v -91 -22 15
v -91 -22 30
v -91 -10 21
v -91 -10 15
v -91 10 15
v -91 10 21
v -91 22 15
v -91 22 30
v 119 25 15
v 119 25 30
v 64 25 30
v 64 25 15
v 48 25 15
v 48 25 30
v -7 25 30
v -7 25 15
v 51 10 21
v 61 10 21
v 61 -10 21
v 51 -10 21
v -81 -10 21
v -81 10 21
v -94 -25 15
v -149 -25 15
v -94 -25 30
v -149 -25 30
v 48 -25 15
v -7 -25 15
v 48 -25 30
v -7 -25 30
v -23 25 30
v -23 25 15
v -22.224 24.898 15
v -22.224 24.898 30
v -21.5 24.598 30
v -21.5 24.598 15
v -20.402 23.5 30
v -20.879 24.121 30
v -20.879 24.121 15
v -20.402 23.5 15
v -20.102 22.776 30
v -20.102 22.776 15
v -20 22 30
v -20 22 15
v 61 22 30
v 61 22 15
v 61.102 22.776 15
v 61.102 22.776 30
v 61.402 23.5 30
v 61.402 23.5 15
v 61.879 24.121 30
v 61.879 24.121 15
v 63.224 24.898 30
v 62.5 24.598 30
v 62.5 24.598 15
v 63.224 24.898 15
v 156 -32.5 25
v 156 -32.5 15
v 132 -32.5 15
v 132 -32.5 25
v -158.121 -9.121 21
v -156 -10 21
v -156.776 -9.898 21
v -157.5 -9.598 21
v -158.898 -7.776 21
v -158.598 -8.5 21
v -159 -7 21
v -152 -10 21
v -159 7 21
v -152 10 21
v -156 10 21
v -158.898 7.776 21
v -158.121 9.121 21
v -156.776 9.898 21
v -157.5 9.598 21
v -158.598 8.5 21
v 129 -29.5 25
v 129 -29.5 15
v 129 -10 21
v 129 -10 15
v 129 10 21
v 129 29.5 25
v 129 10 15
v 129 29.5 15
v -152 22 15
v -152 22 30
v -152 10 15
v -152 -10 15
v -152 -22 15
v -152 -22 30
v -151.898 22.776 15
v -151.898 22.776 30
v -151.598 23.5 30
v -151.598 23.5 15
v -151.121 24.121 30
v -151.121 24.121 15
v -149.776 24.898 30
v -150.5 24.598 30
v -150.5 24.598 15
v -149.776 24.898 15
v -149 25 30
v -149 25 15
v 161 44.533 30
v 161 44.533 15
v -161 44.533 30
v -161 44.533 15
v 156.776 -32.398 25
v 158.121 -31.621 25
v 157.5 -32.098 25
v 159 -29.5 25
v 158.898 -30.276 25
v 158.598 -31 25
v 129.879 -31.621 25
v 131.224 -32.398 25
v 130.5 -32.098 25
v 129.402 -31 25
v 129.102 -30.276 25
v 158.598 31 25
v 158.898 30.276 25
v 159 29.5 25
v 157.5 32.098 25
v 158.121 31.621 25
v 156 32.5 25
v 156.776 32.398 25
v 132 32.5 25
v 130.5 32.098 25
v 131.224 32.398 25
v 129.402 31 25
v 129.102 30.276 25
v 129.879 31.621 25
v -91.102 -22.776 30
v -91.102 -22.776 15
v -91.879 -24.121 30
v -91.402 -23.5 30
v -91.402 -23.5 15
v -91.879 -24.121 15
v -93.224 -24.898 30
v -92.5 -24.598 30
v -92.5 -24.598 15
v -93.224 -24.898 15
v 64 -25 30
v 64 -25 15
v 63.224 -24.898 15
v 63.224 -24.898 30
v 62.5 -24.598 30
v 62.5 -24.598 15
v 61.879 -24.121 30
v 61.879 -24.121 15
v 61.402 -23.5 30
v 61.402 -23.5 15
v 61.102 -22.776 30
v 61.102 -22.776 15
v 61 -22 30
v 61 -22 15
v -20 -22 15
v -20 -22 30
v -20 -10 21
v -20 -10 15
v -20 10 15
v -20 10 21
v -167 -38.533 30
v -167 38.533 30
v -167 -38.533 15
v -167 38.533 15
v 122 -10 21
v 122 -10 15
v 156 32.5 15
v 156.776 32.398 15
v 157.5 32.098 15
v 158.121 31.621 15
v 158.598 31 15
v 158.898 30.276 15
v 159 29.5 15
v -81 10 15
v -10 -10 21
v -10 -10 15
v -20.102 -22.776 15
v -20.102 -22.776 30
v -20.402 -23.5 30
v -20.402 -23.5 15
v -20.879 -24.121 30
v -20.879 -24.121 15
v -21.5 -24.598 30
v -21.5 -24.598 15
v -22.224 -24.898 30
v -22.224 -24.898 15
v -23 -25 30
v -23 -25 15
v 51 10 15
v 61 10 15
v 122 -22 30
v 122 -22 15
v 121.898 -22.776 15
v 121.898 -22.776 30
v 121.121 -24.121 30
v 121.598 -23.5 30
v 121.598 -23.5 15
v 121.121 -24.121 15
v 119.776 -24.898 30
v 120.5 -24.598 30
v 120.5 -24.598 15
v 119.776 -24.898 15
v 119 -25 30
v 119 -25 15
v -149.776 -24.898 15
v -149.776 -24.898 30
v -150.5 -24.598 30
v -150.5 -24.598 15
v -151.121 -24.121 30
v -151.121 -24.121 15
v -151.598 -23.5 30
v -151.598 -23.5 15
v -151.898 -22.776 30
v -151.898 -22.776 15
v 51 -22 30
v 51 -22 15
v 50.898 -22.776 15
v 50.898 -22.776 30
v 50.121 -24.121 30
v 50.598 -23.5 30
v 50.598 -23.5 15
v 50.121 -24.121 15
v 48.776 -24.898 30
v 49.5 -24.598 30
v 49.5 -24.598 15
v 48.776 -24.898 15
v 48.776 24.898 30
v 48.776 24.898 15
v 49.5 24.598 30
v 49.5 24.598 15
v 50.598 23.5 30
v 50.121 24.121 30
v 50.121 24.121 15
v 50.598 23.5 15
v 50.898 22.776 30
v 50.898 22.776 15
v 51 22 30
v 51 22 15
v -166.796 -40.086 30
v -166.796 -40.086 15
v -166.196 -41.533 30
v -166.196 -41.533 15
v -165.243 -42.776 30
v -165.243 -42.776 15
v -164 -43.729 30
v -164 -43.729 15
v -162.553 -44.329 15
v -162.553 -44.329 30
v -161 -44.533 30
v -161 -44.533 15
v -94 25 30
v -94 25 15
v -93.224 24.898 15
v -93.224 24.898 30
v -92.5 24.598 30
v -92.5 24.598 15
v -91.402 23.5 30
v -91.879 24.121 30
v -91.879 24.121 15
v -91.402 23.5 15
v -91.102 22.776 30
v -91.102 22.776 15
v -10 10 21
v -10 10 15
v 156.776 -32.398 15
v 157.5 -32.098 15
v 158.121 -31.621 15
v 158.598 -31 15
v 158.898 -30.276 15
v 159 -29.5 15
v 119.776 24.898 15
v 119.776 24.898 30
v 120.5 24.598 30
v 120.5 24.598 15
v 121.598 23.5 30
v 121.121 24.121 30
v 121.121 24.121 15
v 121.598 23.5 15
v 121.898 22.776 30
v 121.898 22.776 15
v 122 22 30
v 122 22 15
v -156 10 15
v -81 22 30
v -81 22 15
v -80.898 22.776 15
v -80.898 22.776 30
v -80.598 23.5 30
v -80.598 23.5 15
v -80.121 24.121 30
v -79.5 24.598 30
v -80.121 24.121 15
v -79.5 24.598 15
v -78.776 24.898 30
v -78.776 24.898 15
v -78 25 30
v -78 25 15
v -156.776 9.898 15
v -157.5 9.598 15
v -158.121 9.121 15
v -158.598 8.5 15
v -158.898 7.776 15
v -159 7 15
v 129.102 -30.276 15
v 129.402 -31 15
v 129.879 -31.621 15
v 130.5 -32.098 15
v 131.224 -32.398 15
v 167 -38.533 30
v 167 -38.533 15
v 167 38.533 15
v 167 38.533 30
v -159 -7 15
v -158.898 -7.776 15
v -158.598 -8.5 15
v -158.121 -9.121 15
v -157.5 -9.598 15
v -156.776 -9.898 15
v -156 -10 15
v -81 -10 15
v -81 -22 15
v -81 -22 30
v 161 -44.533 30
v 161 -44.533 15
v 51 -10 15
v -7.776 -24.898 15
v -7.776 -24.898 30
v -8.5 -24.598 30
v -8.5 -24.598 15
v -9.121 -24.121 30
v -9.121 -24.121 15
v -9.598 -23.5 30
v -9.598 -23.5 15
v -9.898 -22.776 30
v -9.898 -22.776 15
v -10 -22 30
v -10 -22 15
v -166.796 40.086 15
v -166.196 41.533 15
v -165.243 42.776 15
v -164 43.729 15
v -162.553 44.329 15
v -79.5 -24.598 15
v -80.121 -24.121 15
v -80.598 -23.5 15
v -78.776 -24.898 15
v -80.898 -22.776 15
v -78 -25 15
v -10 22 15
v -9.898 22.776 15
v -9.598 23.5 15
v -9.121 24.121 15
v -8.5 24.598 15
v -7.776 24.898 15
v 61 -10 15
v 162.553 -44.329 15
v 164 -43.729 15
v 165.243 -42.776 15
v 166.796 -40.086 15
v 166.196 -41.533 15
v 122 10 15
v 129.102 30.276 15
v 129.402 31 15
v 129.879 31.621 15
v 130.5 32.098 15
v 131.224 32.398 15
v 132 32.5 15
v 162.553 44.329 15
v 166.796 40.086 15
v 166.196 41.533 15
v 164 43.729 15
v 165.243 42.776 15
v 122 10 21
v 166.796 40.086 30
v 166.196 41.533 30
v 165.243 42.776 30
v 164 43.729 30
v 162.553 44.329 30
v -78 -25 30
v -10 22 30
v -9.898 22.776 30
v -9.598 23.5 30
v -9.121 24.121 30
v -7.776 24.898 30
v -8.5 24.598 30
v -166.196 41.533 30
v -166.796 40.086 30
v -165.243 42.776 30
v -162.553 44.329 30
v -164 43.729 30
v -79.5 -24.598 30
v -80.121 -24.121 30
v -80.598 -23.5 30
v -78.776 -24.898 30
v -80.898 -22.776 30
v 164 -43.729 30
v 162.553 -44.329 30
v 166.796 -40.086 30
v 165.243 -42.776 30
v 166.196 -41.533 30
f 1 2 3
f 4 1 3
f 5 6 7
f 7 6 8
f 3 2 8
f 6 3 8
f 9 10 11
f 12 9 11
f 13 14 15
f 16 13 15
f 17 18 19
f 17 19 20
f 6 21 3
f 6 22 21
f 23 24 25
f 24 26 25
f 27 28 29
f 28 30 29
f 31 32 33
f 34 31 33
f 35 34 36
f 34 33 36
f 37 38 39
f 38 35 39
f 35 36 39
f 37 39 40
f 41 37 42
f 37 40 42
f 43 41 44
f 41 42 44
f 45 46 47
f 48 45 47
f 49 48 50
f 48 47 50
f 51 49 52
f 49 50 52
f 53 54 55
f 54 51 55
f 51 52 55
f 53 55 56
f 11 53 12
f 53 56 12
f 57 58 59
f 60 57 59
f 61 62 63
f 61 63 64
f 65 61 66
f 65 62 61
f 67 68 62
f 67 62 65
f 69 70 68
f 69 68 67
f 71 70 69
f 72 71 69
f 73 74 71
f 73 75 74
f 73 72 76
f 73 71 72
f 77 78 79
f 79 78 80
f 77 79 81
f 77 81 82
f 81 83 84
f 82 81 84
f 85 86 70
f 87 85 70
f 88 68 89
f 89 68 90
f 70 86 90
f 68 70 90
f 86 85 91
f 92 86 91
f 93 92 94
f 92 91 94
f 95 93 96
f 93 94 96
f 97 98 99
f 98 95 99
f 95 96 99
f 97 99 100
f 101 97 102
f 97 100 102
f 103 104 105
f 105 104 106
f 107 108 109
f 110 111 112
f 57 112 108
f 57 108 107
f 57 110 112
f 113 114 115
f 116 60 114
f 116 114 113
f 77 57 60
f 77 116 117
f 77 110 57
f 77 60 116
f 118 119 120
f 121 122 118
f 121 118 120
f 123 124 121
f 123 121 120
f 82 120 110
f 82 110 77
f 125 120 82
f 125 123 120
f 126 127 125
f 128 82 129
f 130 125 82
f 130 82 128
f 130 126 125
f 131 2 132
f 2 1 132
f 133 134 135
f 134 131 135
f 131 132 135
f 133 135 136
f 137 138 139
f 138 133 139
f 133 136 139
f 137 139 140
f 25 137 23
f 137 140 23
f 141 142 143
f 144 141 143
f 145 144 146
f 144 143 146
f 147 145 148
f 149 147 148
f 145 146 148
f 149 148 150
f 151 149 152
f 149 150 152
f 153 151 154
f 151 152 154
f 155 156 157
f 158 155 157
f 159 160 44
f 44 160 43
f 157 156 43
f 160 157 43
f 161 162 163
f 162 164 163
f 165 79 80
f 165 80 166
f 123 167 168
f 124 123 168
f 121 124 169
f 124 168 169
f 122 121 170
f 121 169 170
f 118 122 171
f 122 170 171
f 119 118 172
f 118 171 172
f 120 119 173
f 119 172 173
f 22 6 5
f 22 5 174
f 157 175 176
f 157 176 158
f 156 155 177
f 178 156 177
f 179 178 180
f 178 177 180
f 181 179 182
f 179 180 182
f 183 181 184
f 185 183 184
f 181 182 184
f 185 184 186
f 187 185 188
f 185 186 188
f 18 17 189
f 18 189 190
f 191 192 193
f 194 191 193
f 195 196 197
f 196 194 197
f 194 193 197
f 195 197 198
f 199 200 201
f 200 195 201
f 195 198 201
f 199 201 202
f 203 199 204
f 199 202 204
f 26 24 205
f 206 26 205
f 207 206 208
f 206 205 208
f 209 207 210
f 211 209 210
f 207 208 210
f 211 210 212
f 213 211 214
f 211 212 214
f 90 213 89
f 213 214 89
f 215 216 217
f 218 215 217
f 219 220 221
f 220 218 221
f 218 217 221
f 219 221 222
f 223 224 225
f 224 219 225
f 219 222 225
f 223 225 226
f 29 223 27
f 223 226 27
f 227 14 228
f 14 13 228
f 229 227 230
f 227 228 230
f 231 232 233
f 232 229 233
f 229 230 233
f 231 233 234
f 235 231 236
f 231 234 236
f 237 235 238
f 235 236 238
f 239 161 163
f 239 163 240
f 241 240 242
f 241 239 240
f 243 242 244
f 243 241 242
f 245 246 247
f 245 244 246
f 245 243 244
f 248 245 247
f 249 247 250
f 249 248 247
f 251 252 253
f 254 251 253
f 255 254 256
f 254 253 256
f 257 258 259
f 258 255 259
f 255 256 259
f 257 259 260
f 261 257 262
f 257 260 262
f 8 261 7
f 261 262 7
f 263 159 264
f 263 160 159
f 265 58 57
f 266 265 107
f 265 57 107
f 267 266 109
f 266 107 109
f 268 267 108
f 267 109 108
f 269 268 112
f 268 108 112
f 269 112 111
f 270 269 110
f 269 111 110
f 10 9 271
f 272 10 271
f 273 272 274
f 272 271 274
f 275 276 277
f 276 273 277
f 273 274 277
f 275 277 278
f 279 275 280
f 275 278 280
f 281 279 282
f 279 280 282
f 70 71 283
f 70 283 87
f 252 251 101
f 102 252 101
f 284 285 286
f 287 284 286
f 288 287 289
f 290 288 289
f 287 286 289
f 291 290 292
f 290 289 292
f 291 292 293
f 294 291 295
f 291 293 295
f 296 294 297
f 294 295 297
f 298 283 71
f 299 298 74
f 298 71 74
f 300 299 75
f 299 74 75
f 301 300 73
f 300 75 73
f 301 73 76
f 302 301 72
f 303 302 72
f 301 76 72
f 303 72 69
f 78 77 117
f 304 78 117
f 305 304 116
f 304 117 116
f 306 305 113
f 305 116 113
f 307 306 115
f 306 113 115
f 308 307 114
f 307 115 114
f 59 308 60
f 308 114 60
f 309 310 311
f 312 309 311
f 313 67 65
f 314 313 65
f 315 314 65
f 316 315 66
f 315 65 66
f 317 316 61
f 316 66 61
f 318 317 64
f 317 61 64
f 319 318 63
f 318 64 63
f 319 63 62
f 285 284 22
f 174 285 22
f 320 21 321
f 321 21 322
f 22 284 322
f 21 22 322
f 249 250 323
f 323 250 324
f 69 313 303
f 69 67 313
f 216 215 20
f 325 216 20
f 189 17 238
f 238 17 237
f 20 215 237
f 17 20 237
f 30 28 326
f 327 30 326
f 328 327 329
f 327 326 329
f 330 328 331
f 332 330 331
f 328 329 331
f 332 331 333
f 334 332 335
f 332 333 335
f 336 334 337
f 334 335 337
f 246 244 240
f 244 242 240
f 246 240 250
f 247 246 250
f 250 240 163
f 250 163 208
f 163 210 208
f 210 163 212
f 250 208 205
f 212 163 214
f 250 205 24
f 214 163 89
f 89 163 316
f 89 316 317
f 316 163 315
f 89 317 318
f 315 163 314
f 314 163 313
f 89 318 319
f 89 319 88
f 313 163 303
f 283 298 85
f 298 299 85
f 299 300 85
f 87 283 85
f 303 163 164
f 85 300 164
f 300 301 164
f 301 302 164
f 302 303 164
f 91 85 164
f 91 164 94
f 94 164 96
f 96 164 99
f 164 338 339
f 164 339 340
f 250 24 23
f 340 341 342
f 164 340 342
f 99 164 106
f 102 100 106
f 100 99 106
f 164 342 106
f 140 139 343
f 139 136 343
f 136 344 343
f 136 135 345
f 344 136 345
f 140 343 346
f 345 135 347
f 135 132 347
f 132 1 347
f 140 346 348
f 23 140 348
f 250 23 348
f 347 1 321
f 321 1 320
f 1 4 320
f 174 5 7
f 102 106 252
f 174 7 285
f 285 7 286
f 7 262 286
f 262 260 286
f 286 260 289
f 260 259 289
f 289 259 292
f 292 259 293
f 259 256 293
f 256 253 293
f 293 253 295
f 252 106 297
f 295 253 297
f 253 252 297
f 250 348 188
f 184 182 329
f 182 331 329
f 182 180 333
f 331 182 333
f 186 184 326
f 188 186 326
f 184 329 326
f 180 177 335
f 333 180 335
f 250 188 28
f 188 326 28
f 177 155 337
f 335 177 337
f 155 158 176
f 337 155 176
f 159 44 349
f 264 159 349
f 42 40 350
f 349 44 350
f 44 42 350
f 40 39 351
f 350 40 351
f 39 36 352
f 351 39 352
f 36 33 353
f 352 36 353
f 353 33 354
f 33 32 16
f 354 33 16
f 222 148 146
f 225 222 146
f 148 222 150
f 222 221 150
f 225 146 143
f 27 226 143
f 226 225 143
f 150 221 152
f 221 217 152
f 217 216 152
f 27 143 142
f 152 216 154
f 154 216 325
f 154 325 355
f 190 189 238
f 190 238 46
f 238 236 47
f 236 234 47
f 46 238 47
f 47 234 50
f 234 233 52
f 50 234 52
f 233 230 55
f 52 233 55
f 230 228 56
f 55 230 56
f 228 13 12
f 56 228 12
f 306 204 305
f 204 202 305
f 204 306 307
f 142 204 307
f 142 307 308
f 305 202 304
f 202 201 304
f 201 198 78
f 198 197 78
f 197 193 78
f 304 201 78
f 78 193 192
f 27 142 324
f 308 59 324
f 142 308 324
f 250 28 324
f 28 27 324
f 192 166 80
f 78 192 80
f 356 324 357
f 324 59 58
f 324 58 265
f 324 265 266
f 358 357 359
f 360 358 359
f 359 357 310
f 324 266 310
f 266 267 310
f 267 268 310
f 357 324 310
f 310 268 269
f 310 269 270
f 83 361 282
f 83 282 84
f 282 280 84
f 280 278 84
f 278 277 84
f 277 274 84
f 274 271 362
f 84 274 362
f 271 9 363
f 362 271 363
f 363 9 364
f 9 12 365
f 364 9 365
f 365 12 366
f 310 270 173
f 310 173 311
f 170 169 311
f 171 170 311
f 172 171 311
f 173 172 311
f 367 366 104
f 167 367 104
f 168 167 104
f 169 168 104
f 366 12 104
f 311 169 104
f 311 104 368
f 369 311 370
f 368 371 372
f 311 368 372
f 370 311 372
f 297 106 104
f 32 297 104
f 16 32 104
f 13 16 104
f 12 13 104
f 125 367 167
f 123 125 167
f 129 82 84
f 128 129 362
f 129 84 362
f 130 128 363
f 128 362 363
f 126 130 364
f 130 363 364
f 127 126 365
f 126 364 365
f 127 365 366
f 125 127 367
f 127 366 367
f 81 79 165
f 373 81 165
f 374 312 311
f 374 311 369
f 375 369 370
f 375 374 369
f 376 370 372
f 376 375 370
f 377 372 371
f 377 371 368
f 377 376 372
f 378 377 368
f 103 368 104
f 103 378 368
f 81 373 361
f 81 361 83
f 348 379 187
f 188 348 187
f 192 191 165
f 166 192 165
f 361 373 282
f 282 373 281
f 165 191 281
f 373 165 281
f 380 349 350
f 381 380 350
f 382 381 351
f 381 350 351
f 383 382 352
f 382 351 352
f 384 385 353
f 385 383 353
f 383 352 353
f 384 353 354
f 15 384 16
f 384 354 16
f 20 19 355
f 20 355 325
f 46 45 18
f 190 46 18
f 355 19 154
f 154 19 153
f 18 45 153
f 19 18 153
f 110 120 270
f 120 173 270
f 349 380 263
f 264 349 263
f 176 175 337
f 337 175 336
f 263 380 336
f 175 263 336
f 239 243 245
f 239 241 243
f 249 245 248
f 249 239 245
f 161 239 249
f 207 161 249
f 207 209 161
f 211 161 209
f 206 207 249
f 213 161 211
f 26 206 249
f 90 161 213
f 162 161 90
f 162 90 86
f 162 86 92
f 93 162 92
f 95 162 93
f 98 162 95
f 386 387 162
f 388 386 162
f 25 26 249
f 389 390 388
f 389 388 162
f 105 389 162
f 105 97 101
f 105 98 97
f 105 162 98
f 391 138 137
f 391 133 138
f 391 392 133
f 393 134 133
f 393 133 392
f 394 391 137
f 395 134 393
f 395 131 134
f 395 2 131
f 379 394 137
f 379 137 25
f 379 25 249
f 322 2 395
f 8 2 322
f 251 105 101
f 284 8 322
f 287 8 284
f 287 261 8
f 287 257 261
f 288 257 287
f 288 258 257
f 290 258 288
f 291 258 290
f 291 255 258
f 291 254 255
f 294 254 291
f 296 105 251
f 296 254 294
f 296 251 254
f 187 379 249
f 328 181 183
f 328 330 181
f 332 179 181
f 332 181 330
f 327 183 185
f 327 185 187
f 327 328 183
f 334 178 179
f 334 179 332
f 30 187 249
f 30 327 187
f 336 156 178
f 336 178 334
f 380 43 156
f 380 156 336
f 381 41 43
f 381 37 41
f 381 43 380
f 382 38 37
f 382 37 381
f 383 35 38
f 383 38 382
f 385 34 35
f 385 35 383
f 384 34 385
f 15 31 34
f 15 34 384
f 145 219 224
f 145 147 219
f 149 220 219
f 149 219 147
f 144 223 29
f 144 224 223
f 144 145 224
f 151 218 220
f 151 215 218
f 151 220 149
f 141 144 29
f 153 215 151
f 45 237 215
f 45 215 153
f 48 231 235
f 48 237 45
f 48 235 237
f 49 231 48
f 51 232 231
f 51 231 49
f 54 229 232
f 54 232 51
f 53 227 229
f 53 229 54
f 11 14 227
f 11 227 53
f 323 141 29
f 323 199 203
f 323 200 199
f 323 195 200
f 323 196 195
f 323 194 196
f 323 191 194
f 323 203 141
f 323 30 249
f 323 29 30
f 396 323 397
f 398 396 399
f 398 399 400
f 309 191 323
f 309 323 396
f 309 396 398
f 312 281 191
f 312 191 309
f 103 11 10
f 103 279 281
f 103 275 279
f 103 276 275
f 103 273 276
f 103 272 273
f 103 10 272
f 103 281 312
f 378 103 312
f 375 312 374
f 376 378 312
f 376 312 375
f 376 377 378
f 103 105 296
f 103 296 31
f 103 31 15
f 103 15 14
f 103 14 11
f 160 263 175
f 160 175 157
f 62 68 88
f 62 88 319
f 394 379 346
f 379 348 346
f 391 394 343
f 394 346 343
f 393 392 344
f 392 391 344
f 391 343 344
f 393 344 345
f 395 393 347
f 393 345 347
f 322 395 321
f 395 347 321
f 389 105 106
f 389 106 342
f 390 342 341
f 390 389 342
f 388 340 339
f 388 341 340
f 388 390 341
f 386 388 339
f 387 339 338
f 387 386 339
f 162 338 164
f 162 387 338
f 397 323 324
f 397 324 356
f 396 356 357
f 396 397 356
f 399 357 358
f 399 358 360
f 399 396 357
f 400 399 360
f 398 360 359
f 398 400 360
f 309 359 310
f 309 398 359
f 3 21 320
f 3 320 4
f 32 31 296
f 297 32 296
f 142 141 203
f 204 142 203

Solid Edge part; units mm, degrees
sketch "Sketch1" plane through (0, 0, 0) normal (0, 0, 1) x (1, 0, 0)
  line L0 (-167, -44.5333) -> (167, -44.5333)
  line L1 (167, -44.5333) -> (167, 44.5333)
  line L2 (167, 44.5333) -> (-167, 44.5333)
  line L3 (-167, 44.5333) -> (-167, -44.5333)
extrude "Protrusion1" add sketch "Sketch1" along normal blind 30
sketch "Sketch2" plane through (0, 0, 30) normal (0, 0, 1) x (1, 0, 0)
  line L0 (-152, -25) -> (-91, -25)
  line L1 (-91, -25) -> (-91, 25)
  line L2 (-91, 25) -> (-152, 25)
  line L3 (-152, 25) -> (-152, -25)
extrude "ExtrudedCutout_1" cut sketch "Sketch2" against normal blind 15
fillet "Round_1" radius 3 4 edges at (-152, 25, 22.5) (-91, 25, 22.5) (-152, -25, 22.5) (-91, -25, 22.5)
sketch "Sketch3" plane through (-121.5, 0, 15) normal (0, 0, 1) x (1, 0, 0)
  circle A0 centre (-27.5, 22) radius 2
  circle A1 centre (27.5, 22) radius 2
  circle A2 centre (27.5, -22) radius 2
  circle A3 centre (-27.5, -22) radius 2
  dimension "D1" = 4
  dimension "D2" = 3
  dimension "D3" = 3
extrude "Cutout1" cut sketch "Sketch3" against normal through all
sketch "Sketch4" plane through (0, 0, 0) normal (0, 0, -1) x (-1, 0, 0)
  circle A0 centre (149, 22) radius 4
  circle A1 centre (149, -22) radius 4
  circle A2 centre (94, -22) radius 4
  circle A3 centre (94, 22) radius 4
  dimension "D1" = 8
extrude "ExtrudedCutout_14" cut sketch "Sketch4" against normal blind 5
sketch "Sketch5" plane through (-104.5, 0, 15) normal (0, 0, 1) x (1, 0, 0)
  line L0 (-54.5, 10) -> (263.5, 10)
  line L1 (263.5, 10) -> (263.5, -10)
  line L2 (263.5, -10) -> (-54.5, -10)
  line L3 (-54.5, -10) -> (-54.5, 10)
extrude "ExtrudedCutout_2" cut sketch "Sketch5" against normal blind 6 and the other way blind 6
sketch "Sketch6" plane through (-121.5, -17.5, 15) normal (0, 0, 1) x (-1, 0, 0)
  line L0 (-250.5, 15) -> (-250.5, -50)
  line L1 (-250.5, -50) -> (-280.5, -50)
  line L2 (-280.5, -50) -> (-280.5, 15)
  line L3 (-280.5, 15) -> (-250.5, 15)
extrude "ExtrudedCutout_18" cut sketch "Sketch6" along normal mid plane 20
sketch "Sketch7" plane through (-121.5, -17.5, 15) normal (0, 0, 1) x (-1, 0, 0)
  line L0 (-288.5, -20.5) -> (-280.5, -20.5)
  line L1 (-280.5, -20.5) -> (-280.5, -14.5)
  line L2 (-280.5, -14.5) -> (-288.5, -14.5)
  line L3 (-288.5, -14.5) -> (-288.5, -20.5)
extrude "ExtrudedCutout_19" cut sketch "Sketch7" against normal blind 5
fillet "Round_2" radius 3 6 edges at (-159, 10, 15) (-159, -10, 15) (129, -32.5, 15) (159, -32.5, 15) (159, 32.5, 15) (129, 32.5, 15)
pattern_linear "Pattern1" count 4 spacing 71 along (1, 0, 0) of "ExtrudedCutout_1", "Cutout1", "ExtrudedCutout_14"
fillet "Round1" radius 3 4 edges at (-81, 25, 22.5) (-20, 25, 22.5) (-81, -25, 22.5) (-20, -25, 22.5)
fillet "Round2" radius 3 4 edges at (-10, 25, 22.5) (51, 25, 22.5) (-10, -25, 22.5) (51, -25, 22.5)
fillet "Round3" radius 3 4 edges at (61, 25, 22.5) (122, 25, 22.5) (61, -25, 22.5) (122, -25, 22.5)
sketch "Sketch8" plane through (0, 0, 0) normal (0, 0, -1) x (-1, 0, 0)
  line L0 (-167, 44.5333) -> (167, 44.5333)
  line L1 (167, 44.5333) -> (167, -44.5333)
  line L2 (167, -44.5333) -> (-167, -44.5333)
  line L3 (-167, -44.5333) -> (-167, 44.5333)
extrude "ExtrudedCutout_30" cut sketch "Sketch8" against normal blind 15
fillet "Round_6" radius 6 4 edges at (167, 44.5333, 22.5) (167, -44.5333, 22.5) (-167, -44.5333, 22.5) (-167, 44.5333, 22.5)
